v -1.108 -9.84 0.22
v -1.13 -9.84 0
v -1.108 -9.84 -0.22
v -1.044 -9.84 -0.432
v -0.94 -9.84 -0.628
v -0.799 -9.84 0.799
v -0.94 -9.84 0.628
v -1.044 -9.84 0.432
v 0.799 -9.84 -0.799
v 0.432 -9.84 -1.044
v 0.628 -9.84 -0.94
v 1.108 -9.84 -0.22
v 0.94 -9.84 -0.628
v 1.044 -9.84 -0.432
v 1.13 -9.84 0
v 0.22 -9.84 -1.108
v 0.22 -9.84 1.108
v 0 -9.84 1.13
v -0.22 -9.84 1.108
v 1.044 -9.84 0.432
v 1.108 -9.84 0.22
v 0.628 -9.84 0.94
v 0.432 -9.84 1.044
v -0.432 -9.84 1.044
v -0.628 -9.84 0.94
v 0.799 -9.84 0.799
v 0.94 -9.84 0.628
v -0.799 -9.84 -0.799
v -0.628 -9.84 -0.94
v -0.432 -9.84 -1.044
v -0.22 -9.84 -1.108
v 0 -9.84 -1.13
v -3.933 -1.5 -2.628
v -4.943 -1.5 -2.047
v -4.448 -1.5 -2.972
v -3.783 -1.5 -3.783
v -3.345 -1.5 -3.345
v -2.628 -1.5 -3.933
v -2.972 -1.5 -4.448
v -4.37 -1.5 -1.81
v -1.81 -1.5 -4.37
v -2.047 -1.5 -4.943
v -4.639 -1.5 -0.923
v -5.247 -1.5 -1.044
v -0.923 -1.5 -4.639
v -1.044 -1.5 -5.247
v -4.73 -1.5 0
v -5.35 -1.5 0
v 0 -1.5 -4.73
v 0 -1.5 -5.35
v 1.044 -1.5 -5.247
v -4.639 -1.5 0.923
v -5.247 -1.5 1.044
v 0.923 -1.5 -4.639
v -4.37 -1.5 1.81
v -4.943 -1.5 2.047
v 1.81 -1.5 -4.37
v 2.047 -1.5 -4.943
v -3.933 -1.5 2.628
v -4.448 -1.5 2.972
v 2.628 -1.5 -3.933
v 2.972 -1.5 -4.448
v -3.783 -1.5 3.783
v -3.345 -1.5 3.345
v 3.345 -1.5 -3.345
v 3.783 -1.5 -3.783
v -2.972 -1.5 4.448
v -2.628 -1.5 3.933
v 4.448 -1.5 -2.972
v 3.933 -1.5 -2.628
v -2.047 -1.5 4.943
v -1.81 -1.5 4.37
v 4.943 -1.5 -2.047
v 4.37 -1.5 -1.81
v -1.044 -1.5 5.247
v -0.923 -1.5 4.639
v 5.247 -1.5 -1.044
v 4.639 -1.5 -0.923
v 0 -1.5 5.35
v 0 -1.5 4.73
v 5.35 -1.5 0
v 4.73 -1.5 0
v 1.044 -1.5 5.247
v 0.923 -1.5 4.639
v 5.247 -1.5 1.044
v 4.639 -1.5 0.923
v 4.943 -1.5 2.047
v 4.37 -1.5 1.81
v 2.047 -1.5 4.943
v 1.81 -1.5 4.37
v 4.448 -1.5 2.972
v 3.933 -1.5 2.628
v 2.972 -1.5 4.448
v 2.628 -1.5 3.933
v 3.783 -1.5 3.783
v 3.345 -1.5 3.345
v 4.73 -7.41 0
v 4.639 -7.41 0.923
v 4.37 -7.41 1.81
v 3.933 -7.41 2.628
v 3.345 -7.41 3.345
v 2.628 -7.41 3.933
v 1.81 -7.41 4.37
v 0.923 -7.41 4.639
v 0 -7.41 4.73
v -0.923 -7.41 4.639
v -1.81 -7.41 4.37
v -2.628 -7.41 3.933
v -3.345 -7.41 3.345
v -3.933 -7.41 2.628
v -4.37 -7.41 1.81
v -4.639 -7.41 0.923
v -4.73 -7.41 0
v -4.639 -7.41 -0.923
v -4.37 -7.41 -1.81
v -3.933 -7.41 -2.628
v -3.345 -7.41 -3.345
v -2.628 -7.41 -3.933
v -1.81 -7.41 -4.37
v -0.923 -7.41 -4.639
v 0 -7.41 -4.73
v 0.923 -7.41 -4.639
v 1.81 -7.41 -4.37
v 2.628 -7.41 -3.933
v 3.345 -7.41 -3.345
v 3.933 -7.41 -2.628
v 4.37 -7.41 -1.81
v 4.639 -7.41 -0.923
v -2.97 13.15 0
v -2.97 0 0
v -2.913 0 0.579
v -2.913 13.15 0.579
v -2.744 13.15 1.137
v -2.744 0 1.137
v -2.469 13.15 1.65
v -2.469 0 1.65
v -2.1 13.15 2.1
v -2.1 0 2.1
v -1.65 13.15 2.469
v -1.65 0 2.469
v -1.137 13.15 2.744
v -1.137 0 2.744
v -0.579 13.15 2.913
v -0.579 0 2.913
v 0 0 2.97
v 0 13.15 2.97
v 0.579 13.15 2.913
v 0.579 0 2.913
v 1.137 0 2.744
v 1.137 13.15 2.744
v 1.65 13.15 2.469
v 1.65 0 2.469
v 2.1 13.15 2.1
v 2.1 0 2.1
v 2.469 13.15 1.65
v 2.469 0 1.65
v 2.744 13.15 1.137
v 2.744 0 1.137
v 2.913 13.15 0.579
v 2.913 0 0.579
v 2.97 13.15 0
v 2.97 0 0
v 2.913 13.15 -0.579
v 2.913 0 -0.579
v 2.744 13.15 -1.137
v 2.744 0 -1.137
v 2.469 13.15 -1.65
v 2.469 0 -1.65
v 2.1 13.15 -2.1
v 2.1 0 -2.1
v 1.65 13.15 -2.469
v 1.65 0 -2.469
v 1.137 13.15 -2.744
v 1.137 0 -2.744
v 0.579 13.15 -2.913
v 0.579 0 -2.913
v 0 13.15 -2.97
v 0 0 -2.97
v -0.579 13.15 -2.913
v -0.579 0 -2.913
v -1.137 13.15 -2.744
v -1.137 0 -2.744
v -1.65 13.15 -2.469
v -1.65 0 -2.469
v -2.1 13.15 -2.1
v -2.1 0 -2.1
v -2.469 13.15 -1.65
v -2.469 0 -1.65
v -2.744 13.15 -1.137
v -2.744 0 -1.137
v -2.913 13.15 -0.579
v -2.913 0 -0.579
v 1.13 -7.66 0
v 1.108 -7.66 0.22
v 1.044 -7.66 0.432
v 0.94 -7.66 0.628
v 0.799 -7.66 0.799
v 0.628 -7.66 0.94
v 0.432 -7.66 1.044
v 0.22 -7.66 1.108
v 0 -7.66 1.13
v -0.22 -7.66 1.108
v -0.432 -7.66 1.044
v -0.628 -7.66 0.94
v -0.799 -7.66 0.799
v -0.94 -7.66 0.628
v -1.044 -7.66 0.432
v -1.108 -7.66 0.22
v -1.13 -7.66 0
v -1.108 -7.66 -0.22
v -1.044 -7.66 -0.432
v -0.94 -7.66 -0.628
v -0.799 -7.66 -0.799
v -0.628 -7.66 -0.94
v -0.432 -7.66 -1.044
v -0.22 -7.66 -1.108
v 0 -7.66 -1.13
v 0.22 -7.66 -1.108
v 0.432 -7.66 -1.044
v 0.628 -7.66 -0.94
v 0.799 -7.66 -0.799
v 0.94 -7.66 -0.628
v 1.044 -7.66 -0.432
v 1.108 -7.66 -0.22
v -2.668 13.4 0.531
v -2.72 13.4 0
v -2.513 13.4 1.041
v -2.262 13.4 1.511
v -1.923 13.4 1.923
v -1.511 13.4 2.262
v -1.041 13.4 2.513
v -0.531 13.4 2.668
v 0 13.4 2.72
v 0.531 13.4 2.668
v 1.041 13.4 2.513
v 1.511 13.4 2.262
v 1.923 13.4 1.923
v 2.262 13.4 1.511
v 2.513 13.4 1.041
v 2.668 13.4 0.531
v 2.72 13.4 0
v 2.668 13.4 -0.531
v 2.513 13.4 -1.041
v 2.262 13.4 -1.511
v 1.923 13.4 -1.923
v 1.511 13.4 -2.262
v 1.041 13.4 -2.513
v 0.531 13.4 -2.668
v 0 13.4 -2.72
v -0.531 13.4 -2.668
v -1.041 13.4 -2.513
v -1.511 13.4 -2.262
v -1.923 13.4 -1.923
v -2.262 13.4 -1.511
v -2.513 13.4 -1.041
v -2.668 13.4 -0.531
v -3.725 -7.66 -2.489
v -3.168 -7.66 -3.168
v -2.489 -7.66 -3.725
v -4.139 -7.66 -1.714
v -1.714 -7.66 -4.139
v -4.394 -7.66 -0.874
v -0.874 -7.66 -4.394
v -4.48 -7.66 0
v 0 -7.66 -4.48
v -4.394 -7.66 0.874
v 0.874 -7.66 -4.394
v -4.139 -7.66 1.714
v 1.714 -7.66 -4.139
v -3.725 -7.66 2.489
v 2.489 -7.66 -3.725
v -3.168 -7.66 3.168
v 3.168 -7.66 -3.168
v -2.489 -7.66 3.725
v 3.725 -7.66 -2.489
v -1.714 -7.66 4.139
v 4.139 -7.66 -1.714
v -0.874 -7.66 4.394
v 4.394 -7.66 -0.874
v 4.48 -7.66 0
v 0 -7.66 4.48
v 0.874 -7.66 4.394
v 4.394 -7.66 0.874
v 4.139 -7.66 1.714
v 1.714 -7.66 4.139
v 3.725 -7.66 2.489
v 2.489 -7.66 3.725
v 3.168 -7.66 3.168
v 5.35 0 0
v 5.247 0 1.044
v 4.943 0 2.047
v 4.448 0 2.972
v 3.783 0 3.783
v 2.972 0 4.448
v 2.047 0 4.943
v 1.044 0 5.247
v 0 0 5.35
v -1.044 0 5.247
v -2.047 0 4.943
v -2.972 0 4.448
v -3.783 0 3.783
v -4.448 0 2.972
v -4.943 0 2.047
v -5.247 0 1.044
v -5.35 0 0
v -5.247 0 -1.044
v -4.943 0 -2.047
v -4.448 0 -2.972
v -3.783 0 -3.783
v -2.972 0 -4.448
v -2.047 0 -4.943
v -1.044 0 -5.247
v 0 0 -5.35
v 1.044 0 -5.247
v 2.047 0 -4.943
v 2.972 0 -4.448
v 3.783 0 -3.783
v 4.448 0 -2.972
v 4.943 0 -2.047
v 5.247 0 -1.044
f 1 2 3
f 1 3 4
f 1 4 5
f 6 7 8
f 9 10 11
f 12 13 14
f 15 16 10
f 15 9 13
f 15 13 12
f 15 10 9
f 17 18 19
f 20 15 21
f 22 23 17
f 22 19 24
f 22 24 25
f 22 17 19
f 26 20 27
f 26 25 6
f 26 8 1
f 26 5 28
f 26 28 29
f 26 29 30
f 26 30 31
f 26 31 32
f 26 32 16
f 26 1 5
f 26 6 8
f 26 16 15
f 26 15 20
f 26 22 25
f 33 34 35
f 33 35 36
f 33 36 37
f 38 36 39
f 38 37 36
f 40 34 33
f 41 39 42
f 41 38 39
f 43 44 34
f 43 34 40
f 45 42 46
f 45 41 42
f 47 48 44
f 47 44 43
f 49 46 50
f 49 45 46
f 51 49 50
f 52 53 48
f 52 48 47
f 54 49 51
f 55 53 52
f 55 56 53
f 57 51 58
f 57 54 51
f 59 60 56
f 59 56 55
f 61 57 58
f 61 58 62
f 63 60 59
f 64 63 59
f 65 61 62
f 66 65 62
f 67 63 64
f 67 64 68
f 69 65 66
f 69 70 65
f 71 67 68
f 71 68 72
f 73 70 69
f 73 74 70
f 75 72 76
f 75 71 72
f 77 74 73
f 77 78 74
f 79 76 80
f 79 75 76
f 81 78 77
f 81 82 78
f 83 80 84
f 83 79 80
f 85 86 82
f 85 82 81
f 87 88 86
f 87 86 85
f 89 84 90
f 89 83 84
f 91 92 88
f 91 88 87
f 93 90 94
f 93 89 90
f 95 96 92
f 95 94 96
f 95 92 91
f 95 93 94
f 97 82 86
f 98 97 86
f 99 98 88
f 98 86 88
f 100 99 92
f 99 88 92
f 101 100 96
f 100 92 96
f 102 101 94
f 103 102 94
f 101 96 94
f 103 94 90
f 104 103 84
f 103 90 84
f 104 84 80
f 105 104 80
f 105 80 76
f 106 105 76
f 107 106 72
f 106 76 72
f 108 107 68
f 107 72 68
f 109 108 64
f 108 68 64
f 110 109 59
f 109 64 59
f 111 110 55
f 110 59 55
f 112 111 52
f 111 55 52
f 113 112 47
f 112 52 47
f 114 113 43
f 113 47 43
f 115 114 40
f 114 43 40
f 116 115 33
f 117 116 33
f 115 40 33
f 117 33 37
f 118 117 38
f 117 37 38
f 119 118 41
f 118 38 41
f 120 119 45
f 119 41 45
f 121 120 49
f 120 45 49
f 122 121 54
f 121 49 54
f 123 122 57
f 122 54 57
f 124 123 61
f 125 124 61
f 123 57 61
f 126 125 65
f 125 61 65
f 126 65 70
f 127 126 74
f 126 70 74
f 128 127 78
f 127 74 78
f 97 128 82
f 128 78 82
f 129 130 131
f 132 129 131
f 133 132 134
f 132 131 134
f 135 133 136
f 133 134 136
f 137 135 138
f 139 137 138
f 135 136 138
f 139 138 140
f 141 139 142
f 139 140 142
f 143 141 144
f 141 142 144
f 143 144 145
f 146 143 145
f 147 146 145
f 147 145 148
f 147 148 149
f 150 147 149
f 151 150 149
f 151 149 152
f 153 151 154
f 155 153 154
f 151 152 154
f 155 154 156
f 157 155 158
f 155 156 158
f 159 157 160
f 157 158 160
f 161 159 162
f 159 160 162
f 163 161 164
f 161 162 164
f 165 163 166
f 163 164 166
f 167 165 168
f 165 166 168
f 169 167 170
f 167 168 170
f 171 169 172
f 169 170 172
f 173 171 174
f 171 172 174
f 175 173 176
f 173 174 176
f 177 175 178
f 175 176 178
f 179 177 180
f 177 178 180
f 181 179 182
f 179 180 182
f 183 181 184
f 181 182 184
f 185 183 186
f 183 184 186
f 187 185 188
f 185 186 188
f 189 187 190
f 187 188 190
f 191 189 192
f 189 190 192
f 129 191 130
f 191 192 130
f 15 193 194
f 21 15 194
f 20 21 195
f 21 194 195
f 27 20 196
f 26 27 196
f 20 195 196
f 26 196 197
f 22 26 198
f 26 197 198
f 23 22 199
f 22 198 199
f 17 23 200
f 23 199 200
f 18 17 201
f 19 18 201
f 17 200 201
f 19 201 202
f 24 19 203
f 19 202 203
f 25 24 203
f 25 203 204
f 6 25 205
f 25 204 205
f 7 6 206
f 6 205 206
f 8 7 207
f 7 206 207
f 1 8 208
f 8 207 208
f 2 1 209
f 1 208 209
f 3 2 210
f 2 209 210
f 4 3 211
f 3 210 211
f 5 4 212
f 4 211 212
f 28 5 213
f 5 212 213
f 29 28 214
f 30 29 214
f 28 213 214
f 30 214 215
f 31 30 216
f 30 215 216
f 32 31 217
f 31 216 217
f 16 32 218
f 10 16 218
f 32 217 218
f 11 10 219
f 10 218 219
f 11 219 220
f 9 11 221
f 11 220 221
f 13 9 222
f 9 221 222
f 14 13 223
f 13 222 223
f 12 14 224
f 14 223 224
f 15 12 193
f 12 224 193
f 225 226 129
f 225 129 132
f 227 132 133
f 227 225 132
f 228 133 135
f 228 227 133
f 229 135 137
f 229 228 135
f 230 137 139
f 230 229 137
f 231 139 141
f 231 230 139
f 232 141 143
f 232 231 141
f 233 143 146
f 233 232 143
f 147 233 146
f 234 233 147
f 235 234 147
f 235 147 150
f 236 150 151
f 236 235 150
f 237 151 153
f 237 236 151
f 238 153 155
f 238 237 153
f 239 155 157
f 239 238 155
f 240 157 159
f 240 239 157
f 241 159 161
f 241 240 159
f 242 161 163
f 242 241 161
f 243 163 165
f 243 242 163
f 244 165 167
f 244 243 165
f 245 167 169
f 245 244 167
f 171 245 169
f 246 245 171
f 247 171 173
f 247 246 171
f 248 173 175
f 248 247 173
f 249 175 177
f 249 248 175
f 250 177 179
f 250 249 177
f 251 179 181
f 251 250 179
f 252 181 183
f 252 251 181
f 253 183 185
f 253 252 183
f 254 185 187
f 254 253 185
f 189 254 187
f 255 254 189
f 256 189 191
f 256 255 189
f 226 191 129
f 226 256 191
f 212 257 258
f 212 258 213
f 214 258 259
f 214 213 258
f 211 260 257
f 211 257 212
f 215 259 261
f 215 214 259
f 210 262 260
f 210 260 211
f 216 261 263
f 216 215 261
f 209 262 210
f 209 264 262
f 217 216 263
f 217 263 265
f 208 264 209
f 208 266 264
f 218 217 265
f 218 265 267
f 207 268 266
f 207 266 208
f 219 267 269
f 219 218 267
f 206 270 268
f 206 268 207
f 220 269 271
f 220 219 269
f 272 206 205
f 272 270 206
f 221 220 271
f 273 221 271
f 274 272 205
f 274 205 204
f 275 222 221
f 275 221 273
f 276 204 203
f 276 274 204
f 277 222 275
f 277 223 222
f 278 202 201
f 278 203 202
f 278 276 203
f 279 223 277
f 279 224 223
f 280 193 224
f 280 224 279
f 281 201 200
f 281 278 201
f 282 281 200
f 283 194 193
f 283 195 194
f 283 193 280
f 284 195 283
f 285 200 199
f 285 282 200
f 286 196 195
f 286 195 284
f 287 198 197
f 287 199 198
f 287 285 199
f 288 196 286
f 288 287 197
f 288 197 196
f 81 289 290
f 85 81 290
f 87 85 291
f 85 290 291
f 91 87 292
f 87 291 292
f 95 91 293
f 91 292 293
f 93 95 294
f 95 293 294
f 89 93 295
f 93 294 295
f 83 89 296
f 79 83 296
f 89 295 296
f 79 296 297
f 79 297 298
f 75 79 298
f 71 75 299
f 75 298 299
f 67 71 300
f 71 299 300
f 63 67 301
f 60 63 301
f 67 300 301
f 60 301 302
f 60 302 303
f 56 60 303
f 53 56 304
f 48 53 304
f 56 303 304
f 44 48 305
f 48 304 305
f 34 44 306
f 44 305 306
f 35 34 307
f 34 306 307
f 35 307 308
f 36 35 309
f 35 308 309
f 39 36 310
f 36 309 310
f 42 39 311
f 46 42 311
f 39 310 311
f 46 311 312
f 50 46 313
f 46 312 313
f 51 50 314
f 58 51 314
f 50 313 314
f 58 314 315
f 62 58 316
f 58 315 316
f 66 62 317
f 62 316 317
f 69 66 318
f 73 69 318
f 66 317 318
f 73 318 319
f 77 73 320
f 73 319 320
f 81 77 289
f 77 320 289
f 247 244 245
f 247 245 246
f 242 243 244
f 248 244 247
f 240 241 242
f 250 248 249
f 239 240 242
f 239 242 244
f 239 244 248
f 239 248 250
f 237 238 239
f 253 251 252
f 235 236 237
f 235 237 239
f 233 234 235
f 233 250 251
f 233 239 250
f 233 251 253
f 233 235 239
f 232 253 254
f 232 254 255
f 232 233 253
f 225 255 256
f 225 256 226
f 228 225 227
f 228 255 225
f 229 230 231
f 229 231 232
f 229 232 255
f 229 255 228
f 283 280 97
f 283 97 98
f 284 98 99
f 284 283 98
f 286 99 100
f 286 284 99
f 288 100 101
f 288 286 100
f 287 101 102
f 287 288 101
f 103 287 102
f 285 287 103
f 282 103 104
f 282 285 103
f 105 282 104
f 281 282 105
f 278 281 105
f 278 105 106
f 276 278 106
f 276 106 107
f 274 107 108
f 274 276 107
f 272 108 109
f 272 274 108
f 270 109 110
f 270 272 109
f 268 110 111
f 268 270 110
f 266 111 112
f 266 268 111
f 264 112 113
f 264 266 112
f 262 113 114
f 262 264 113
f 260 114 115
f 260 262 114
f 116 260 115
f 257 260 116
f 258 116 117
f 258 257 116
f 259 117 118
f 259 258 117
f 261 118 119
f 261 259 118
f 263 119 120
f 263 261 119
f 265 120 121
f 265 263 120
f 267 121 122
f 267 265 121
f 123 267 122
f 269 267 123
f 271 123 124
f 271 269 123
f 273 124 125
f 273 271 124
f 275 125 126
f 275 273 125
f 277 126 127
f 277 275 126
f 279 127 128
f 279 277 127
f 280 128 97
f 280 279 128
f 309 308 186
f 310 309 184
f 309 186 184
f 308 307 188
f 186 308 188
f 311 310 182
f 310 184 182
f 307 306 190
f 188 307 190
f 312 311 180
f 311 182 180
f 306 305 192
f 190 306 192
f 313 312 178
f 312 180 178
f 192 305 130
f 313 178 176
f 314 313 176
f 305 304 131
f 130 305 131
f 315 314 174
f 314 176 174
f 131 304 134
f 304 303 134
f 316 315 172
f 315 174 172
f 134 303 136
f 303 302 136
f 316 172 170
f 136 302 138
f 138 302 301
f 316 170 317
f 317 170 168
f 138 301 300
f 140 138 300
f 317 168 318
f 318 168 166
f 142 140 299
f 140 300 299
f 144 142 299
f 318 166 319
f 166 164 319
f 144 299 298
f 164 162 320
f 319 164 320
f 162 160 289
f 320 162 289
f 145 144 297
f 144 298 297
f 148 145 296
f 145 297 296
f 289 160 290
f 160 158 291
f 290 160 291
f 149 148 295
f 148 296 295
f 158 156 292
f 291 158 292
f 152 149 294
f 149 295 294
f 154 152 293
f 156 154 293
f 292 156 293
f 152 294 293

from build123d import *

# Parameters (mm, degrees)
F0_R     = 5.35
F1_DEPTH = 1.5
F2_R     = 4.73
F3_DEPTH = 6.16
F4_R     = 1.13
F5_DEPTH = 2.18
F6_R     = 2.97
F7_DEPTH = 13.4
F8_SIZE  = 0.25


with BuildPart() as f1:
    # F0 (on Front) → F1 (new body)
    with BuildSketch(Plane.XZ):
        Circle(F0_R)
    extrude(amount=F1_DEPTH)

    # F2 (on face) → F3 (join)
    with BuildSketch(Plane.XZ.offset(1.5)):
        Circle(F2_R)
    extrude(amount=F3_DEPTH)

    # F4 (on face) → F5 (join)
    with BuildSketch(Plane.XZ.offset(7.66)):
        Circle(F4_R)
    extrude(amount=F5_DEPTH)

    # F6 (on face) → F7 (join)
    with BuildSketch(Plane(origin=(0, 0, 0), x_dir=(-1, 0, 0), z_dir=(0, 1, 0))):
        Circle(F6_R)
    extrude(amount=F7_DEPTH)

    # F8
    f8_edges = [f1.edges().sort_by_distance(p)[0] for p in [
        (-4.73, -7.66, 0),
        (2.97, 13.4, 0),
    ]]
    chamfer(f8_edges, length=F8_SIZE)


solid = f1.part
